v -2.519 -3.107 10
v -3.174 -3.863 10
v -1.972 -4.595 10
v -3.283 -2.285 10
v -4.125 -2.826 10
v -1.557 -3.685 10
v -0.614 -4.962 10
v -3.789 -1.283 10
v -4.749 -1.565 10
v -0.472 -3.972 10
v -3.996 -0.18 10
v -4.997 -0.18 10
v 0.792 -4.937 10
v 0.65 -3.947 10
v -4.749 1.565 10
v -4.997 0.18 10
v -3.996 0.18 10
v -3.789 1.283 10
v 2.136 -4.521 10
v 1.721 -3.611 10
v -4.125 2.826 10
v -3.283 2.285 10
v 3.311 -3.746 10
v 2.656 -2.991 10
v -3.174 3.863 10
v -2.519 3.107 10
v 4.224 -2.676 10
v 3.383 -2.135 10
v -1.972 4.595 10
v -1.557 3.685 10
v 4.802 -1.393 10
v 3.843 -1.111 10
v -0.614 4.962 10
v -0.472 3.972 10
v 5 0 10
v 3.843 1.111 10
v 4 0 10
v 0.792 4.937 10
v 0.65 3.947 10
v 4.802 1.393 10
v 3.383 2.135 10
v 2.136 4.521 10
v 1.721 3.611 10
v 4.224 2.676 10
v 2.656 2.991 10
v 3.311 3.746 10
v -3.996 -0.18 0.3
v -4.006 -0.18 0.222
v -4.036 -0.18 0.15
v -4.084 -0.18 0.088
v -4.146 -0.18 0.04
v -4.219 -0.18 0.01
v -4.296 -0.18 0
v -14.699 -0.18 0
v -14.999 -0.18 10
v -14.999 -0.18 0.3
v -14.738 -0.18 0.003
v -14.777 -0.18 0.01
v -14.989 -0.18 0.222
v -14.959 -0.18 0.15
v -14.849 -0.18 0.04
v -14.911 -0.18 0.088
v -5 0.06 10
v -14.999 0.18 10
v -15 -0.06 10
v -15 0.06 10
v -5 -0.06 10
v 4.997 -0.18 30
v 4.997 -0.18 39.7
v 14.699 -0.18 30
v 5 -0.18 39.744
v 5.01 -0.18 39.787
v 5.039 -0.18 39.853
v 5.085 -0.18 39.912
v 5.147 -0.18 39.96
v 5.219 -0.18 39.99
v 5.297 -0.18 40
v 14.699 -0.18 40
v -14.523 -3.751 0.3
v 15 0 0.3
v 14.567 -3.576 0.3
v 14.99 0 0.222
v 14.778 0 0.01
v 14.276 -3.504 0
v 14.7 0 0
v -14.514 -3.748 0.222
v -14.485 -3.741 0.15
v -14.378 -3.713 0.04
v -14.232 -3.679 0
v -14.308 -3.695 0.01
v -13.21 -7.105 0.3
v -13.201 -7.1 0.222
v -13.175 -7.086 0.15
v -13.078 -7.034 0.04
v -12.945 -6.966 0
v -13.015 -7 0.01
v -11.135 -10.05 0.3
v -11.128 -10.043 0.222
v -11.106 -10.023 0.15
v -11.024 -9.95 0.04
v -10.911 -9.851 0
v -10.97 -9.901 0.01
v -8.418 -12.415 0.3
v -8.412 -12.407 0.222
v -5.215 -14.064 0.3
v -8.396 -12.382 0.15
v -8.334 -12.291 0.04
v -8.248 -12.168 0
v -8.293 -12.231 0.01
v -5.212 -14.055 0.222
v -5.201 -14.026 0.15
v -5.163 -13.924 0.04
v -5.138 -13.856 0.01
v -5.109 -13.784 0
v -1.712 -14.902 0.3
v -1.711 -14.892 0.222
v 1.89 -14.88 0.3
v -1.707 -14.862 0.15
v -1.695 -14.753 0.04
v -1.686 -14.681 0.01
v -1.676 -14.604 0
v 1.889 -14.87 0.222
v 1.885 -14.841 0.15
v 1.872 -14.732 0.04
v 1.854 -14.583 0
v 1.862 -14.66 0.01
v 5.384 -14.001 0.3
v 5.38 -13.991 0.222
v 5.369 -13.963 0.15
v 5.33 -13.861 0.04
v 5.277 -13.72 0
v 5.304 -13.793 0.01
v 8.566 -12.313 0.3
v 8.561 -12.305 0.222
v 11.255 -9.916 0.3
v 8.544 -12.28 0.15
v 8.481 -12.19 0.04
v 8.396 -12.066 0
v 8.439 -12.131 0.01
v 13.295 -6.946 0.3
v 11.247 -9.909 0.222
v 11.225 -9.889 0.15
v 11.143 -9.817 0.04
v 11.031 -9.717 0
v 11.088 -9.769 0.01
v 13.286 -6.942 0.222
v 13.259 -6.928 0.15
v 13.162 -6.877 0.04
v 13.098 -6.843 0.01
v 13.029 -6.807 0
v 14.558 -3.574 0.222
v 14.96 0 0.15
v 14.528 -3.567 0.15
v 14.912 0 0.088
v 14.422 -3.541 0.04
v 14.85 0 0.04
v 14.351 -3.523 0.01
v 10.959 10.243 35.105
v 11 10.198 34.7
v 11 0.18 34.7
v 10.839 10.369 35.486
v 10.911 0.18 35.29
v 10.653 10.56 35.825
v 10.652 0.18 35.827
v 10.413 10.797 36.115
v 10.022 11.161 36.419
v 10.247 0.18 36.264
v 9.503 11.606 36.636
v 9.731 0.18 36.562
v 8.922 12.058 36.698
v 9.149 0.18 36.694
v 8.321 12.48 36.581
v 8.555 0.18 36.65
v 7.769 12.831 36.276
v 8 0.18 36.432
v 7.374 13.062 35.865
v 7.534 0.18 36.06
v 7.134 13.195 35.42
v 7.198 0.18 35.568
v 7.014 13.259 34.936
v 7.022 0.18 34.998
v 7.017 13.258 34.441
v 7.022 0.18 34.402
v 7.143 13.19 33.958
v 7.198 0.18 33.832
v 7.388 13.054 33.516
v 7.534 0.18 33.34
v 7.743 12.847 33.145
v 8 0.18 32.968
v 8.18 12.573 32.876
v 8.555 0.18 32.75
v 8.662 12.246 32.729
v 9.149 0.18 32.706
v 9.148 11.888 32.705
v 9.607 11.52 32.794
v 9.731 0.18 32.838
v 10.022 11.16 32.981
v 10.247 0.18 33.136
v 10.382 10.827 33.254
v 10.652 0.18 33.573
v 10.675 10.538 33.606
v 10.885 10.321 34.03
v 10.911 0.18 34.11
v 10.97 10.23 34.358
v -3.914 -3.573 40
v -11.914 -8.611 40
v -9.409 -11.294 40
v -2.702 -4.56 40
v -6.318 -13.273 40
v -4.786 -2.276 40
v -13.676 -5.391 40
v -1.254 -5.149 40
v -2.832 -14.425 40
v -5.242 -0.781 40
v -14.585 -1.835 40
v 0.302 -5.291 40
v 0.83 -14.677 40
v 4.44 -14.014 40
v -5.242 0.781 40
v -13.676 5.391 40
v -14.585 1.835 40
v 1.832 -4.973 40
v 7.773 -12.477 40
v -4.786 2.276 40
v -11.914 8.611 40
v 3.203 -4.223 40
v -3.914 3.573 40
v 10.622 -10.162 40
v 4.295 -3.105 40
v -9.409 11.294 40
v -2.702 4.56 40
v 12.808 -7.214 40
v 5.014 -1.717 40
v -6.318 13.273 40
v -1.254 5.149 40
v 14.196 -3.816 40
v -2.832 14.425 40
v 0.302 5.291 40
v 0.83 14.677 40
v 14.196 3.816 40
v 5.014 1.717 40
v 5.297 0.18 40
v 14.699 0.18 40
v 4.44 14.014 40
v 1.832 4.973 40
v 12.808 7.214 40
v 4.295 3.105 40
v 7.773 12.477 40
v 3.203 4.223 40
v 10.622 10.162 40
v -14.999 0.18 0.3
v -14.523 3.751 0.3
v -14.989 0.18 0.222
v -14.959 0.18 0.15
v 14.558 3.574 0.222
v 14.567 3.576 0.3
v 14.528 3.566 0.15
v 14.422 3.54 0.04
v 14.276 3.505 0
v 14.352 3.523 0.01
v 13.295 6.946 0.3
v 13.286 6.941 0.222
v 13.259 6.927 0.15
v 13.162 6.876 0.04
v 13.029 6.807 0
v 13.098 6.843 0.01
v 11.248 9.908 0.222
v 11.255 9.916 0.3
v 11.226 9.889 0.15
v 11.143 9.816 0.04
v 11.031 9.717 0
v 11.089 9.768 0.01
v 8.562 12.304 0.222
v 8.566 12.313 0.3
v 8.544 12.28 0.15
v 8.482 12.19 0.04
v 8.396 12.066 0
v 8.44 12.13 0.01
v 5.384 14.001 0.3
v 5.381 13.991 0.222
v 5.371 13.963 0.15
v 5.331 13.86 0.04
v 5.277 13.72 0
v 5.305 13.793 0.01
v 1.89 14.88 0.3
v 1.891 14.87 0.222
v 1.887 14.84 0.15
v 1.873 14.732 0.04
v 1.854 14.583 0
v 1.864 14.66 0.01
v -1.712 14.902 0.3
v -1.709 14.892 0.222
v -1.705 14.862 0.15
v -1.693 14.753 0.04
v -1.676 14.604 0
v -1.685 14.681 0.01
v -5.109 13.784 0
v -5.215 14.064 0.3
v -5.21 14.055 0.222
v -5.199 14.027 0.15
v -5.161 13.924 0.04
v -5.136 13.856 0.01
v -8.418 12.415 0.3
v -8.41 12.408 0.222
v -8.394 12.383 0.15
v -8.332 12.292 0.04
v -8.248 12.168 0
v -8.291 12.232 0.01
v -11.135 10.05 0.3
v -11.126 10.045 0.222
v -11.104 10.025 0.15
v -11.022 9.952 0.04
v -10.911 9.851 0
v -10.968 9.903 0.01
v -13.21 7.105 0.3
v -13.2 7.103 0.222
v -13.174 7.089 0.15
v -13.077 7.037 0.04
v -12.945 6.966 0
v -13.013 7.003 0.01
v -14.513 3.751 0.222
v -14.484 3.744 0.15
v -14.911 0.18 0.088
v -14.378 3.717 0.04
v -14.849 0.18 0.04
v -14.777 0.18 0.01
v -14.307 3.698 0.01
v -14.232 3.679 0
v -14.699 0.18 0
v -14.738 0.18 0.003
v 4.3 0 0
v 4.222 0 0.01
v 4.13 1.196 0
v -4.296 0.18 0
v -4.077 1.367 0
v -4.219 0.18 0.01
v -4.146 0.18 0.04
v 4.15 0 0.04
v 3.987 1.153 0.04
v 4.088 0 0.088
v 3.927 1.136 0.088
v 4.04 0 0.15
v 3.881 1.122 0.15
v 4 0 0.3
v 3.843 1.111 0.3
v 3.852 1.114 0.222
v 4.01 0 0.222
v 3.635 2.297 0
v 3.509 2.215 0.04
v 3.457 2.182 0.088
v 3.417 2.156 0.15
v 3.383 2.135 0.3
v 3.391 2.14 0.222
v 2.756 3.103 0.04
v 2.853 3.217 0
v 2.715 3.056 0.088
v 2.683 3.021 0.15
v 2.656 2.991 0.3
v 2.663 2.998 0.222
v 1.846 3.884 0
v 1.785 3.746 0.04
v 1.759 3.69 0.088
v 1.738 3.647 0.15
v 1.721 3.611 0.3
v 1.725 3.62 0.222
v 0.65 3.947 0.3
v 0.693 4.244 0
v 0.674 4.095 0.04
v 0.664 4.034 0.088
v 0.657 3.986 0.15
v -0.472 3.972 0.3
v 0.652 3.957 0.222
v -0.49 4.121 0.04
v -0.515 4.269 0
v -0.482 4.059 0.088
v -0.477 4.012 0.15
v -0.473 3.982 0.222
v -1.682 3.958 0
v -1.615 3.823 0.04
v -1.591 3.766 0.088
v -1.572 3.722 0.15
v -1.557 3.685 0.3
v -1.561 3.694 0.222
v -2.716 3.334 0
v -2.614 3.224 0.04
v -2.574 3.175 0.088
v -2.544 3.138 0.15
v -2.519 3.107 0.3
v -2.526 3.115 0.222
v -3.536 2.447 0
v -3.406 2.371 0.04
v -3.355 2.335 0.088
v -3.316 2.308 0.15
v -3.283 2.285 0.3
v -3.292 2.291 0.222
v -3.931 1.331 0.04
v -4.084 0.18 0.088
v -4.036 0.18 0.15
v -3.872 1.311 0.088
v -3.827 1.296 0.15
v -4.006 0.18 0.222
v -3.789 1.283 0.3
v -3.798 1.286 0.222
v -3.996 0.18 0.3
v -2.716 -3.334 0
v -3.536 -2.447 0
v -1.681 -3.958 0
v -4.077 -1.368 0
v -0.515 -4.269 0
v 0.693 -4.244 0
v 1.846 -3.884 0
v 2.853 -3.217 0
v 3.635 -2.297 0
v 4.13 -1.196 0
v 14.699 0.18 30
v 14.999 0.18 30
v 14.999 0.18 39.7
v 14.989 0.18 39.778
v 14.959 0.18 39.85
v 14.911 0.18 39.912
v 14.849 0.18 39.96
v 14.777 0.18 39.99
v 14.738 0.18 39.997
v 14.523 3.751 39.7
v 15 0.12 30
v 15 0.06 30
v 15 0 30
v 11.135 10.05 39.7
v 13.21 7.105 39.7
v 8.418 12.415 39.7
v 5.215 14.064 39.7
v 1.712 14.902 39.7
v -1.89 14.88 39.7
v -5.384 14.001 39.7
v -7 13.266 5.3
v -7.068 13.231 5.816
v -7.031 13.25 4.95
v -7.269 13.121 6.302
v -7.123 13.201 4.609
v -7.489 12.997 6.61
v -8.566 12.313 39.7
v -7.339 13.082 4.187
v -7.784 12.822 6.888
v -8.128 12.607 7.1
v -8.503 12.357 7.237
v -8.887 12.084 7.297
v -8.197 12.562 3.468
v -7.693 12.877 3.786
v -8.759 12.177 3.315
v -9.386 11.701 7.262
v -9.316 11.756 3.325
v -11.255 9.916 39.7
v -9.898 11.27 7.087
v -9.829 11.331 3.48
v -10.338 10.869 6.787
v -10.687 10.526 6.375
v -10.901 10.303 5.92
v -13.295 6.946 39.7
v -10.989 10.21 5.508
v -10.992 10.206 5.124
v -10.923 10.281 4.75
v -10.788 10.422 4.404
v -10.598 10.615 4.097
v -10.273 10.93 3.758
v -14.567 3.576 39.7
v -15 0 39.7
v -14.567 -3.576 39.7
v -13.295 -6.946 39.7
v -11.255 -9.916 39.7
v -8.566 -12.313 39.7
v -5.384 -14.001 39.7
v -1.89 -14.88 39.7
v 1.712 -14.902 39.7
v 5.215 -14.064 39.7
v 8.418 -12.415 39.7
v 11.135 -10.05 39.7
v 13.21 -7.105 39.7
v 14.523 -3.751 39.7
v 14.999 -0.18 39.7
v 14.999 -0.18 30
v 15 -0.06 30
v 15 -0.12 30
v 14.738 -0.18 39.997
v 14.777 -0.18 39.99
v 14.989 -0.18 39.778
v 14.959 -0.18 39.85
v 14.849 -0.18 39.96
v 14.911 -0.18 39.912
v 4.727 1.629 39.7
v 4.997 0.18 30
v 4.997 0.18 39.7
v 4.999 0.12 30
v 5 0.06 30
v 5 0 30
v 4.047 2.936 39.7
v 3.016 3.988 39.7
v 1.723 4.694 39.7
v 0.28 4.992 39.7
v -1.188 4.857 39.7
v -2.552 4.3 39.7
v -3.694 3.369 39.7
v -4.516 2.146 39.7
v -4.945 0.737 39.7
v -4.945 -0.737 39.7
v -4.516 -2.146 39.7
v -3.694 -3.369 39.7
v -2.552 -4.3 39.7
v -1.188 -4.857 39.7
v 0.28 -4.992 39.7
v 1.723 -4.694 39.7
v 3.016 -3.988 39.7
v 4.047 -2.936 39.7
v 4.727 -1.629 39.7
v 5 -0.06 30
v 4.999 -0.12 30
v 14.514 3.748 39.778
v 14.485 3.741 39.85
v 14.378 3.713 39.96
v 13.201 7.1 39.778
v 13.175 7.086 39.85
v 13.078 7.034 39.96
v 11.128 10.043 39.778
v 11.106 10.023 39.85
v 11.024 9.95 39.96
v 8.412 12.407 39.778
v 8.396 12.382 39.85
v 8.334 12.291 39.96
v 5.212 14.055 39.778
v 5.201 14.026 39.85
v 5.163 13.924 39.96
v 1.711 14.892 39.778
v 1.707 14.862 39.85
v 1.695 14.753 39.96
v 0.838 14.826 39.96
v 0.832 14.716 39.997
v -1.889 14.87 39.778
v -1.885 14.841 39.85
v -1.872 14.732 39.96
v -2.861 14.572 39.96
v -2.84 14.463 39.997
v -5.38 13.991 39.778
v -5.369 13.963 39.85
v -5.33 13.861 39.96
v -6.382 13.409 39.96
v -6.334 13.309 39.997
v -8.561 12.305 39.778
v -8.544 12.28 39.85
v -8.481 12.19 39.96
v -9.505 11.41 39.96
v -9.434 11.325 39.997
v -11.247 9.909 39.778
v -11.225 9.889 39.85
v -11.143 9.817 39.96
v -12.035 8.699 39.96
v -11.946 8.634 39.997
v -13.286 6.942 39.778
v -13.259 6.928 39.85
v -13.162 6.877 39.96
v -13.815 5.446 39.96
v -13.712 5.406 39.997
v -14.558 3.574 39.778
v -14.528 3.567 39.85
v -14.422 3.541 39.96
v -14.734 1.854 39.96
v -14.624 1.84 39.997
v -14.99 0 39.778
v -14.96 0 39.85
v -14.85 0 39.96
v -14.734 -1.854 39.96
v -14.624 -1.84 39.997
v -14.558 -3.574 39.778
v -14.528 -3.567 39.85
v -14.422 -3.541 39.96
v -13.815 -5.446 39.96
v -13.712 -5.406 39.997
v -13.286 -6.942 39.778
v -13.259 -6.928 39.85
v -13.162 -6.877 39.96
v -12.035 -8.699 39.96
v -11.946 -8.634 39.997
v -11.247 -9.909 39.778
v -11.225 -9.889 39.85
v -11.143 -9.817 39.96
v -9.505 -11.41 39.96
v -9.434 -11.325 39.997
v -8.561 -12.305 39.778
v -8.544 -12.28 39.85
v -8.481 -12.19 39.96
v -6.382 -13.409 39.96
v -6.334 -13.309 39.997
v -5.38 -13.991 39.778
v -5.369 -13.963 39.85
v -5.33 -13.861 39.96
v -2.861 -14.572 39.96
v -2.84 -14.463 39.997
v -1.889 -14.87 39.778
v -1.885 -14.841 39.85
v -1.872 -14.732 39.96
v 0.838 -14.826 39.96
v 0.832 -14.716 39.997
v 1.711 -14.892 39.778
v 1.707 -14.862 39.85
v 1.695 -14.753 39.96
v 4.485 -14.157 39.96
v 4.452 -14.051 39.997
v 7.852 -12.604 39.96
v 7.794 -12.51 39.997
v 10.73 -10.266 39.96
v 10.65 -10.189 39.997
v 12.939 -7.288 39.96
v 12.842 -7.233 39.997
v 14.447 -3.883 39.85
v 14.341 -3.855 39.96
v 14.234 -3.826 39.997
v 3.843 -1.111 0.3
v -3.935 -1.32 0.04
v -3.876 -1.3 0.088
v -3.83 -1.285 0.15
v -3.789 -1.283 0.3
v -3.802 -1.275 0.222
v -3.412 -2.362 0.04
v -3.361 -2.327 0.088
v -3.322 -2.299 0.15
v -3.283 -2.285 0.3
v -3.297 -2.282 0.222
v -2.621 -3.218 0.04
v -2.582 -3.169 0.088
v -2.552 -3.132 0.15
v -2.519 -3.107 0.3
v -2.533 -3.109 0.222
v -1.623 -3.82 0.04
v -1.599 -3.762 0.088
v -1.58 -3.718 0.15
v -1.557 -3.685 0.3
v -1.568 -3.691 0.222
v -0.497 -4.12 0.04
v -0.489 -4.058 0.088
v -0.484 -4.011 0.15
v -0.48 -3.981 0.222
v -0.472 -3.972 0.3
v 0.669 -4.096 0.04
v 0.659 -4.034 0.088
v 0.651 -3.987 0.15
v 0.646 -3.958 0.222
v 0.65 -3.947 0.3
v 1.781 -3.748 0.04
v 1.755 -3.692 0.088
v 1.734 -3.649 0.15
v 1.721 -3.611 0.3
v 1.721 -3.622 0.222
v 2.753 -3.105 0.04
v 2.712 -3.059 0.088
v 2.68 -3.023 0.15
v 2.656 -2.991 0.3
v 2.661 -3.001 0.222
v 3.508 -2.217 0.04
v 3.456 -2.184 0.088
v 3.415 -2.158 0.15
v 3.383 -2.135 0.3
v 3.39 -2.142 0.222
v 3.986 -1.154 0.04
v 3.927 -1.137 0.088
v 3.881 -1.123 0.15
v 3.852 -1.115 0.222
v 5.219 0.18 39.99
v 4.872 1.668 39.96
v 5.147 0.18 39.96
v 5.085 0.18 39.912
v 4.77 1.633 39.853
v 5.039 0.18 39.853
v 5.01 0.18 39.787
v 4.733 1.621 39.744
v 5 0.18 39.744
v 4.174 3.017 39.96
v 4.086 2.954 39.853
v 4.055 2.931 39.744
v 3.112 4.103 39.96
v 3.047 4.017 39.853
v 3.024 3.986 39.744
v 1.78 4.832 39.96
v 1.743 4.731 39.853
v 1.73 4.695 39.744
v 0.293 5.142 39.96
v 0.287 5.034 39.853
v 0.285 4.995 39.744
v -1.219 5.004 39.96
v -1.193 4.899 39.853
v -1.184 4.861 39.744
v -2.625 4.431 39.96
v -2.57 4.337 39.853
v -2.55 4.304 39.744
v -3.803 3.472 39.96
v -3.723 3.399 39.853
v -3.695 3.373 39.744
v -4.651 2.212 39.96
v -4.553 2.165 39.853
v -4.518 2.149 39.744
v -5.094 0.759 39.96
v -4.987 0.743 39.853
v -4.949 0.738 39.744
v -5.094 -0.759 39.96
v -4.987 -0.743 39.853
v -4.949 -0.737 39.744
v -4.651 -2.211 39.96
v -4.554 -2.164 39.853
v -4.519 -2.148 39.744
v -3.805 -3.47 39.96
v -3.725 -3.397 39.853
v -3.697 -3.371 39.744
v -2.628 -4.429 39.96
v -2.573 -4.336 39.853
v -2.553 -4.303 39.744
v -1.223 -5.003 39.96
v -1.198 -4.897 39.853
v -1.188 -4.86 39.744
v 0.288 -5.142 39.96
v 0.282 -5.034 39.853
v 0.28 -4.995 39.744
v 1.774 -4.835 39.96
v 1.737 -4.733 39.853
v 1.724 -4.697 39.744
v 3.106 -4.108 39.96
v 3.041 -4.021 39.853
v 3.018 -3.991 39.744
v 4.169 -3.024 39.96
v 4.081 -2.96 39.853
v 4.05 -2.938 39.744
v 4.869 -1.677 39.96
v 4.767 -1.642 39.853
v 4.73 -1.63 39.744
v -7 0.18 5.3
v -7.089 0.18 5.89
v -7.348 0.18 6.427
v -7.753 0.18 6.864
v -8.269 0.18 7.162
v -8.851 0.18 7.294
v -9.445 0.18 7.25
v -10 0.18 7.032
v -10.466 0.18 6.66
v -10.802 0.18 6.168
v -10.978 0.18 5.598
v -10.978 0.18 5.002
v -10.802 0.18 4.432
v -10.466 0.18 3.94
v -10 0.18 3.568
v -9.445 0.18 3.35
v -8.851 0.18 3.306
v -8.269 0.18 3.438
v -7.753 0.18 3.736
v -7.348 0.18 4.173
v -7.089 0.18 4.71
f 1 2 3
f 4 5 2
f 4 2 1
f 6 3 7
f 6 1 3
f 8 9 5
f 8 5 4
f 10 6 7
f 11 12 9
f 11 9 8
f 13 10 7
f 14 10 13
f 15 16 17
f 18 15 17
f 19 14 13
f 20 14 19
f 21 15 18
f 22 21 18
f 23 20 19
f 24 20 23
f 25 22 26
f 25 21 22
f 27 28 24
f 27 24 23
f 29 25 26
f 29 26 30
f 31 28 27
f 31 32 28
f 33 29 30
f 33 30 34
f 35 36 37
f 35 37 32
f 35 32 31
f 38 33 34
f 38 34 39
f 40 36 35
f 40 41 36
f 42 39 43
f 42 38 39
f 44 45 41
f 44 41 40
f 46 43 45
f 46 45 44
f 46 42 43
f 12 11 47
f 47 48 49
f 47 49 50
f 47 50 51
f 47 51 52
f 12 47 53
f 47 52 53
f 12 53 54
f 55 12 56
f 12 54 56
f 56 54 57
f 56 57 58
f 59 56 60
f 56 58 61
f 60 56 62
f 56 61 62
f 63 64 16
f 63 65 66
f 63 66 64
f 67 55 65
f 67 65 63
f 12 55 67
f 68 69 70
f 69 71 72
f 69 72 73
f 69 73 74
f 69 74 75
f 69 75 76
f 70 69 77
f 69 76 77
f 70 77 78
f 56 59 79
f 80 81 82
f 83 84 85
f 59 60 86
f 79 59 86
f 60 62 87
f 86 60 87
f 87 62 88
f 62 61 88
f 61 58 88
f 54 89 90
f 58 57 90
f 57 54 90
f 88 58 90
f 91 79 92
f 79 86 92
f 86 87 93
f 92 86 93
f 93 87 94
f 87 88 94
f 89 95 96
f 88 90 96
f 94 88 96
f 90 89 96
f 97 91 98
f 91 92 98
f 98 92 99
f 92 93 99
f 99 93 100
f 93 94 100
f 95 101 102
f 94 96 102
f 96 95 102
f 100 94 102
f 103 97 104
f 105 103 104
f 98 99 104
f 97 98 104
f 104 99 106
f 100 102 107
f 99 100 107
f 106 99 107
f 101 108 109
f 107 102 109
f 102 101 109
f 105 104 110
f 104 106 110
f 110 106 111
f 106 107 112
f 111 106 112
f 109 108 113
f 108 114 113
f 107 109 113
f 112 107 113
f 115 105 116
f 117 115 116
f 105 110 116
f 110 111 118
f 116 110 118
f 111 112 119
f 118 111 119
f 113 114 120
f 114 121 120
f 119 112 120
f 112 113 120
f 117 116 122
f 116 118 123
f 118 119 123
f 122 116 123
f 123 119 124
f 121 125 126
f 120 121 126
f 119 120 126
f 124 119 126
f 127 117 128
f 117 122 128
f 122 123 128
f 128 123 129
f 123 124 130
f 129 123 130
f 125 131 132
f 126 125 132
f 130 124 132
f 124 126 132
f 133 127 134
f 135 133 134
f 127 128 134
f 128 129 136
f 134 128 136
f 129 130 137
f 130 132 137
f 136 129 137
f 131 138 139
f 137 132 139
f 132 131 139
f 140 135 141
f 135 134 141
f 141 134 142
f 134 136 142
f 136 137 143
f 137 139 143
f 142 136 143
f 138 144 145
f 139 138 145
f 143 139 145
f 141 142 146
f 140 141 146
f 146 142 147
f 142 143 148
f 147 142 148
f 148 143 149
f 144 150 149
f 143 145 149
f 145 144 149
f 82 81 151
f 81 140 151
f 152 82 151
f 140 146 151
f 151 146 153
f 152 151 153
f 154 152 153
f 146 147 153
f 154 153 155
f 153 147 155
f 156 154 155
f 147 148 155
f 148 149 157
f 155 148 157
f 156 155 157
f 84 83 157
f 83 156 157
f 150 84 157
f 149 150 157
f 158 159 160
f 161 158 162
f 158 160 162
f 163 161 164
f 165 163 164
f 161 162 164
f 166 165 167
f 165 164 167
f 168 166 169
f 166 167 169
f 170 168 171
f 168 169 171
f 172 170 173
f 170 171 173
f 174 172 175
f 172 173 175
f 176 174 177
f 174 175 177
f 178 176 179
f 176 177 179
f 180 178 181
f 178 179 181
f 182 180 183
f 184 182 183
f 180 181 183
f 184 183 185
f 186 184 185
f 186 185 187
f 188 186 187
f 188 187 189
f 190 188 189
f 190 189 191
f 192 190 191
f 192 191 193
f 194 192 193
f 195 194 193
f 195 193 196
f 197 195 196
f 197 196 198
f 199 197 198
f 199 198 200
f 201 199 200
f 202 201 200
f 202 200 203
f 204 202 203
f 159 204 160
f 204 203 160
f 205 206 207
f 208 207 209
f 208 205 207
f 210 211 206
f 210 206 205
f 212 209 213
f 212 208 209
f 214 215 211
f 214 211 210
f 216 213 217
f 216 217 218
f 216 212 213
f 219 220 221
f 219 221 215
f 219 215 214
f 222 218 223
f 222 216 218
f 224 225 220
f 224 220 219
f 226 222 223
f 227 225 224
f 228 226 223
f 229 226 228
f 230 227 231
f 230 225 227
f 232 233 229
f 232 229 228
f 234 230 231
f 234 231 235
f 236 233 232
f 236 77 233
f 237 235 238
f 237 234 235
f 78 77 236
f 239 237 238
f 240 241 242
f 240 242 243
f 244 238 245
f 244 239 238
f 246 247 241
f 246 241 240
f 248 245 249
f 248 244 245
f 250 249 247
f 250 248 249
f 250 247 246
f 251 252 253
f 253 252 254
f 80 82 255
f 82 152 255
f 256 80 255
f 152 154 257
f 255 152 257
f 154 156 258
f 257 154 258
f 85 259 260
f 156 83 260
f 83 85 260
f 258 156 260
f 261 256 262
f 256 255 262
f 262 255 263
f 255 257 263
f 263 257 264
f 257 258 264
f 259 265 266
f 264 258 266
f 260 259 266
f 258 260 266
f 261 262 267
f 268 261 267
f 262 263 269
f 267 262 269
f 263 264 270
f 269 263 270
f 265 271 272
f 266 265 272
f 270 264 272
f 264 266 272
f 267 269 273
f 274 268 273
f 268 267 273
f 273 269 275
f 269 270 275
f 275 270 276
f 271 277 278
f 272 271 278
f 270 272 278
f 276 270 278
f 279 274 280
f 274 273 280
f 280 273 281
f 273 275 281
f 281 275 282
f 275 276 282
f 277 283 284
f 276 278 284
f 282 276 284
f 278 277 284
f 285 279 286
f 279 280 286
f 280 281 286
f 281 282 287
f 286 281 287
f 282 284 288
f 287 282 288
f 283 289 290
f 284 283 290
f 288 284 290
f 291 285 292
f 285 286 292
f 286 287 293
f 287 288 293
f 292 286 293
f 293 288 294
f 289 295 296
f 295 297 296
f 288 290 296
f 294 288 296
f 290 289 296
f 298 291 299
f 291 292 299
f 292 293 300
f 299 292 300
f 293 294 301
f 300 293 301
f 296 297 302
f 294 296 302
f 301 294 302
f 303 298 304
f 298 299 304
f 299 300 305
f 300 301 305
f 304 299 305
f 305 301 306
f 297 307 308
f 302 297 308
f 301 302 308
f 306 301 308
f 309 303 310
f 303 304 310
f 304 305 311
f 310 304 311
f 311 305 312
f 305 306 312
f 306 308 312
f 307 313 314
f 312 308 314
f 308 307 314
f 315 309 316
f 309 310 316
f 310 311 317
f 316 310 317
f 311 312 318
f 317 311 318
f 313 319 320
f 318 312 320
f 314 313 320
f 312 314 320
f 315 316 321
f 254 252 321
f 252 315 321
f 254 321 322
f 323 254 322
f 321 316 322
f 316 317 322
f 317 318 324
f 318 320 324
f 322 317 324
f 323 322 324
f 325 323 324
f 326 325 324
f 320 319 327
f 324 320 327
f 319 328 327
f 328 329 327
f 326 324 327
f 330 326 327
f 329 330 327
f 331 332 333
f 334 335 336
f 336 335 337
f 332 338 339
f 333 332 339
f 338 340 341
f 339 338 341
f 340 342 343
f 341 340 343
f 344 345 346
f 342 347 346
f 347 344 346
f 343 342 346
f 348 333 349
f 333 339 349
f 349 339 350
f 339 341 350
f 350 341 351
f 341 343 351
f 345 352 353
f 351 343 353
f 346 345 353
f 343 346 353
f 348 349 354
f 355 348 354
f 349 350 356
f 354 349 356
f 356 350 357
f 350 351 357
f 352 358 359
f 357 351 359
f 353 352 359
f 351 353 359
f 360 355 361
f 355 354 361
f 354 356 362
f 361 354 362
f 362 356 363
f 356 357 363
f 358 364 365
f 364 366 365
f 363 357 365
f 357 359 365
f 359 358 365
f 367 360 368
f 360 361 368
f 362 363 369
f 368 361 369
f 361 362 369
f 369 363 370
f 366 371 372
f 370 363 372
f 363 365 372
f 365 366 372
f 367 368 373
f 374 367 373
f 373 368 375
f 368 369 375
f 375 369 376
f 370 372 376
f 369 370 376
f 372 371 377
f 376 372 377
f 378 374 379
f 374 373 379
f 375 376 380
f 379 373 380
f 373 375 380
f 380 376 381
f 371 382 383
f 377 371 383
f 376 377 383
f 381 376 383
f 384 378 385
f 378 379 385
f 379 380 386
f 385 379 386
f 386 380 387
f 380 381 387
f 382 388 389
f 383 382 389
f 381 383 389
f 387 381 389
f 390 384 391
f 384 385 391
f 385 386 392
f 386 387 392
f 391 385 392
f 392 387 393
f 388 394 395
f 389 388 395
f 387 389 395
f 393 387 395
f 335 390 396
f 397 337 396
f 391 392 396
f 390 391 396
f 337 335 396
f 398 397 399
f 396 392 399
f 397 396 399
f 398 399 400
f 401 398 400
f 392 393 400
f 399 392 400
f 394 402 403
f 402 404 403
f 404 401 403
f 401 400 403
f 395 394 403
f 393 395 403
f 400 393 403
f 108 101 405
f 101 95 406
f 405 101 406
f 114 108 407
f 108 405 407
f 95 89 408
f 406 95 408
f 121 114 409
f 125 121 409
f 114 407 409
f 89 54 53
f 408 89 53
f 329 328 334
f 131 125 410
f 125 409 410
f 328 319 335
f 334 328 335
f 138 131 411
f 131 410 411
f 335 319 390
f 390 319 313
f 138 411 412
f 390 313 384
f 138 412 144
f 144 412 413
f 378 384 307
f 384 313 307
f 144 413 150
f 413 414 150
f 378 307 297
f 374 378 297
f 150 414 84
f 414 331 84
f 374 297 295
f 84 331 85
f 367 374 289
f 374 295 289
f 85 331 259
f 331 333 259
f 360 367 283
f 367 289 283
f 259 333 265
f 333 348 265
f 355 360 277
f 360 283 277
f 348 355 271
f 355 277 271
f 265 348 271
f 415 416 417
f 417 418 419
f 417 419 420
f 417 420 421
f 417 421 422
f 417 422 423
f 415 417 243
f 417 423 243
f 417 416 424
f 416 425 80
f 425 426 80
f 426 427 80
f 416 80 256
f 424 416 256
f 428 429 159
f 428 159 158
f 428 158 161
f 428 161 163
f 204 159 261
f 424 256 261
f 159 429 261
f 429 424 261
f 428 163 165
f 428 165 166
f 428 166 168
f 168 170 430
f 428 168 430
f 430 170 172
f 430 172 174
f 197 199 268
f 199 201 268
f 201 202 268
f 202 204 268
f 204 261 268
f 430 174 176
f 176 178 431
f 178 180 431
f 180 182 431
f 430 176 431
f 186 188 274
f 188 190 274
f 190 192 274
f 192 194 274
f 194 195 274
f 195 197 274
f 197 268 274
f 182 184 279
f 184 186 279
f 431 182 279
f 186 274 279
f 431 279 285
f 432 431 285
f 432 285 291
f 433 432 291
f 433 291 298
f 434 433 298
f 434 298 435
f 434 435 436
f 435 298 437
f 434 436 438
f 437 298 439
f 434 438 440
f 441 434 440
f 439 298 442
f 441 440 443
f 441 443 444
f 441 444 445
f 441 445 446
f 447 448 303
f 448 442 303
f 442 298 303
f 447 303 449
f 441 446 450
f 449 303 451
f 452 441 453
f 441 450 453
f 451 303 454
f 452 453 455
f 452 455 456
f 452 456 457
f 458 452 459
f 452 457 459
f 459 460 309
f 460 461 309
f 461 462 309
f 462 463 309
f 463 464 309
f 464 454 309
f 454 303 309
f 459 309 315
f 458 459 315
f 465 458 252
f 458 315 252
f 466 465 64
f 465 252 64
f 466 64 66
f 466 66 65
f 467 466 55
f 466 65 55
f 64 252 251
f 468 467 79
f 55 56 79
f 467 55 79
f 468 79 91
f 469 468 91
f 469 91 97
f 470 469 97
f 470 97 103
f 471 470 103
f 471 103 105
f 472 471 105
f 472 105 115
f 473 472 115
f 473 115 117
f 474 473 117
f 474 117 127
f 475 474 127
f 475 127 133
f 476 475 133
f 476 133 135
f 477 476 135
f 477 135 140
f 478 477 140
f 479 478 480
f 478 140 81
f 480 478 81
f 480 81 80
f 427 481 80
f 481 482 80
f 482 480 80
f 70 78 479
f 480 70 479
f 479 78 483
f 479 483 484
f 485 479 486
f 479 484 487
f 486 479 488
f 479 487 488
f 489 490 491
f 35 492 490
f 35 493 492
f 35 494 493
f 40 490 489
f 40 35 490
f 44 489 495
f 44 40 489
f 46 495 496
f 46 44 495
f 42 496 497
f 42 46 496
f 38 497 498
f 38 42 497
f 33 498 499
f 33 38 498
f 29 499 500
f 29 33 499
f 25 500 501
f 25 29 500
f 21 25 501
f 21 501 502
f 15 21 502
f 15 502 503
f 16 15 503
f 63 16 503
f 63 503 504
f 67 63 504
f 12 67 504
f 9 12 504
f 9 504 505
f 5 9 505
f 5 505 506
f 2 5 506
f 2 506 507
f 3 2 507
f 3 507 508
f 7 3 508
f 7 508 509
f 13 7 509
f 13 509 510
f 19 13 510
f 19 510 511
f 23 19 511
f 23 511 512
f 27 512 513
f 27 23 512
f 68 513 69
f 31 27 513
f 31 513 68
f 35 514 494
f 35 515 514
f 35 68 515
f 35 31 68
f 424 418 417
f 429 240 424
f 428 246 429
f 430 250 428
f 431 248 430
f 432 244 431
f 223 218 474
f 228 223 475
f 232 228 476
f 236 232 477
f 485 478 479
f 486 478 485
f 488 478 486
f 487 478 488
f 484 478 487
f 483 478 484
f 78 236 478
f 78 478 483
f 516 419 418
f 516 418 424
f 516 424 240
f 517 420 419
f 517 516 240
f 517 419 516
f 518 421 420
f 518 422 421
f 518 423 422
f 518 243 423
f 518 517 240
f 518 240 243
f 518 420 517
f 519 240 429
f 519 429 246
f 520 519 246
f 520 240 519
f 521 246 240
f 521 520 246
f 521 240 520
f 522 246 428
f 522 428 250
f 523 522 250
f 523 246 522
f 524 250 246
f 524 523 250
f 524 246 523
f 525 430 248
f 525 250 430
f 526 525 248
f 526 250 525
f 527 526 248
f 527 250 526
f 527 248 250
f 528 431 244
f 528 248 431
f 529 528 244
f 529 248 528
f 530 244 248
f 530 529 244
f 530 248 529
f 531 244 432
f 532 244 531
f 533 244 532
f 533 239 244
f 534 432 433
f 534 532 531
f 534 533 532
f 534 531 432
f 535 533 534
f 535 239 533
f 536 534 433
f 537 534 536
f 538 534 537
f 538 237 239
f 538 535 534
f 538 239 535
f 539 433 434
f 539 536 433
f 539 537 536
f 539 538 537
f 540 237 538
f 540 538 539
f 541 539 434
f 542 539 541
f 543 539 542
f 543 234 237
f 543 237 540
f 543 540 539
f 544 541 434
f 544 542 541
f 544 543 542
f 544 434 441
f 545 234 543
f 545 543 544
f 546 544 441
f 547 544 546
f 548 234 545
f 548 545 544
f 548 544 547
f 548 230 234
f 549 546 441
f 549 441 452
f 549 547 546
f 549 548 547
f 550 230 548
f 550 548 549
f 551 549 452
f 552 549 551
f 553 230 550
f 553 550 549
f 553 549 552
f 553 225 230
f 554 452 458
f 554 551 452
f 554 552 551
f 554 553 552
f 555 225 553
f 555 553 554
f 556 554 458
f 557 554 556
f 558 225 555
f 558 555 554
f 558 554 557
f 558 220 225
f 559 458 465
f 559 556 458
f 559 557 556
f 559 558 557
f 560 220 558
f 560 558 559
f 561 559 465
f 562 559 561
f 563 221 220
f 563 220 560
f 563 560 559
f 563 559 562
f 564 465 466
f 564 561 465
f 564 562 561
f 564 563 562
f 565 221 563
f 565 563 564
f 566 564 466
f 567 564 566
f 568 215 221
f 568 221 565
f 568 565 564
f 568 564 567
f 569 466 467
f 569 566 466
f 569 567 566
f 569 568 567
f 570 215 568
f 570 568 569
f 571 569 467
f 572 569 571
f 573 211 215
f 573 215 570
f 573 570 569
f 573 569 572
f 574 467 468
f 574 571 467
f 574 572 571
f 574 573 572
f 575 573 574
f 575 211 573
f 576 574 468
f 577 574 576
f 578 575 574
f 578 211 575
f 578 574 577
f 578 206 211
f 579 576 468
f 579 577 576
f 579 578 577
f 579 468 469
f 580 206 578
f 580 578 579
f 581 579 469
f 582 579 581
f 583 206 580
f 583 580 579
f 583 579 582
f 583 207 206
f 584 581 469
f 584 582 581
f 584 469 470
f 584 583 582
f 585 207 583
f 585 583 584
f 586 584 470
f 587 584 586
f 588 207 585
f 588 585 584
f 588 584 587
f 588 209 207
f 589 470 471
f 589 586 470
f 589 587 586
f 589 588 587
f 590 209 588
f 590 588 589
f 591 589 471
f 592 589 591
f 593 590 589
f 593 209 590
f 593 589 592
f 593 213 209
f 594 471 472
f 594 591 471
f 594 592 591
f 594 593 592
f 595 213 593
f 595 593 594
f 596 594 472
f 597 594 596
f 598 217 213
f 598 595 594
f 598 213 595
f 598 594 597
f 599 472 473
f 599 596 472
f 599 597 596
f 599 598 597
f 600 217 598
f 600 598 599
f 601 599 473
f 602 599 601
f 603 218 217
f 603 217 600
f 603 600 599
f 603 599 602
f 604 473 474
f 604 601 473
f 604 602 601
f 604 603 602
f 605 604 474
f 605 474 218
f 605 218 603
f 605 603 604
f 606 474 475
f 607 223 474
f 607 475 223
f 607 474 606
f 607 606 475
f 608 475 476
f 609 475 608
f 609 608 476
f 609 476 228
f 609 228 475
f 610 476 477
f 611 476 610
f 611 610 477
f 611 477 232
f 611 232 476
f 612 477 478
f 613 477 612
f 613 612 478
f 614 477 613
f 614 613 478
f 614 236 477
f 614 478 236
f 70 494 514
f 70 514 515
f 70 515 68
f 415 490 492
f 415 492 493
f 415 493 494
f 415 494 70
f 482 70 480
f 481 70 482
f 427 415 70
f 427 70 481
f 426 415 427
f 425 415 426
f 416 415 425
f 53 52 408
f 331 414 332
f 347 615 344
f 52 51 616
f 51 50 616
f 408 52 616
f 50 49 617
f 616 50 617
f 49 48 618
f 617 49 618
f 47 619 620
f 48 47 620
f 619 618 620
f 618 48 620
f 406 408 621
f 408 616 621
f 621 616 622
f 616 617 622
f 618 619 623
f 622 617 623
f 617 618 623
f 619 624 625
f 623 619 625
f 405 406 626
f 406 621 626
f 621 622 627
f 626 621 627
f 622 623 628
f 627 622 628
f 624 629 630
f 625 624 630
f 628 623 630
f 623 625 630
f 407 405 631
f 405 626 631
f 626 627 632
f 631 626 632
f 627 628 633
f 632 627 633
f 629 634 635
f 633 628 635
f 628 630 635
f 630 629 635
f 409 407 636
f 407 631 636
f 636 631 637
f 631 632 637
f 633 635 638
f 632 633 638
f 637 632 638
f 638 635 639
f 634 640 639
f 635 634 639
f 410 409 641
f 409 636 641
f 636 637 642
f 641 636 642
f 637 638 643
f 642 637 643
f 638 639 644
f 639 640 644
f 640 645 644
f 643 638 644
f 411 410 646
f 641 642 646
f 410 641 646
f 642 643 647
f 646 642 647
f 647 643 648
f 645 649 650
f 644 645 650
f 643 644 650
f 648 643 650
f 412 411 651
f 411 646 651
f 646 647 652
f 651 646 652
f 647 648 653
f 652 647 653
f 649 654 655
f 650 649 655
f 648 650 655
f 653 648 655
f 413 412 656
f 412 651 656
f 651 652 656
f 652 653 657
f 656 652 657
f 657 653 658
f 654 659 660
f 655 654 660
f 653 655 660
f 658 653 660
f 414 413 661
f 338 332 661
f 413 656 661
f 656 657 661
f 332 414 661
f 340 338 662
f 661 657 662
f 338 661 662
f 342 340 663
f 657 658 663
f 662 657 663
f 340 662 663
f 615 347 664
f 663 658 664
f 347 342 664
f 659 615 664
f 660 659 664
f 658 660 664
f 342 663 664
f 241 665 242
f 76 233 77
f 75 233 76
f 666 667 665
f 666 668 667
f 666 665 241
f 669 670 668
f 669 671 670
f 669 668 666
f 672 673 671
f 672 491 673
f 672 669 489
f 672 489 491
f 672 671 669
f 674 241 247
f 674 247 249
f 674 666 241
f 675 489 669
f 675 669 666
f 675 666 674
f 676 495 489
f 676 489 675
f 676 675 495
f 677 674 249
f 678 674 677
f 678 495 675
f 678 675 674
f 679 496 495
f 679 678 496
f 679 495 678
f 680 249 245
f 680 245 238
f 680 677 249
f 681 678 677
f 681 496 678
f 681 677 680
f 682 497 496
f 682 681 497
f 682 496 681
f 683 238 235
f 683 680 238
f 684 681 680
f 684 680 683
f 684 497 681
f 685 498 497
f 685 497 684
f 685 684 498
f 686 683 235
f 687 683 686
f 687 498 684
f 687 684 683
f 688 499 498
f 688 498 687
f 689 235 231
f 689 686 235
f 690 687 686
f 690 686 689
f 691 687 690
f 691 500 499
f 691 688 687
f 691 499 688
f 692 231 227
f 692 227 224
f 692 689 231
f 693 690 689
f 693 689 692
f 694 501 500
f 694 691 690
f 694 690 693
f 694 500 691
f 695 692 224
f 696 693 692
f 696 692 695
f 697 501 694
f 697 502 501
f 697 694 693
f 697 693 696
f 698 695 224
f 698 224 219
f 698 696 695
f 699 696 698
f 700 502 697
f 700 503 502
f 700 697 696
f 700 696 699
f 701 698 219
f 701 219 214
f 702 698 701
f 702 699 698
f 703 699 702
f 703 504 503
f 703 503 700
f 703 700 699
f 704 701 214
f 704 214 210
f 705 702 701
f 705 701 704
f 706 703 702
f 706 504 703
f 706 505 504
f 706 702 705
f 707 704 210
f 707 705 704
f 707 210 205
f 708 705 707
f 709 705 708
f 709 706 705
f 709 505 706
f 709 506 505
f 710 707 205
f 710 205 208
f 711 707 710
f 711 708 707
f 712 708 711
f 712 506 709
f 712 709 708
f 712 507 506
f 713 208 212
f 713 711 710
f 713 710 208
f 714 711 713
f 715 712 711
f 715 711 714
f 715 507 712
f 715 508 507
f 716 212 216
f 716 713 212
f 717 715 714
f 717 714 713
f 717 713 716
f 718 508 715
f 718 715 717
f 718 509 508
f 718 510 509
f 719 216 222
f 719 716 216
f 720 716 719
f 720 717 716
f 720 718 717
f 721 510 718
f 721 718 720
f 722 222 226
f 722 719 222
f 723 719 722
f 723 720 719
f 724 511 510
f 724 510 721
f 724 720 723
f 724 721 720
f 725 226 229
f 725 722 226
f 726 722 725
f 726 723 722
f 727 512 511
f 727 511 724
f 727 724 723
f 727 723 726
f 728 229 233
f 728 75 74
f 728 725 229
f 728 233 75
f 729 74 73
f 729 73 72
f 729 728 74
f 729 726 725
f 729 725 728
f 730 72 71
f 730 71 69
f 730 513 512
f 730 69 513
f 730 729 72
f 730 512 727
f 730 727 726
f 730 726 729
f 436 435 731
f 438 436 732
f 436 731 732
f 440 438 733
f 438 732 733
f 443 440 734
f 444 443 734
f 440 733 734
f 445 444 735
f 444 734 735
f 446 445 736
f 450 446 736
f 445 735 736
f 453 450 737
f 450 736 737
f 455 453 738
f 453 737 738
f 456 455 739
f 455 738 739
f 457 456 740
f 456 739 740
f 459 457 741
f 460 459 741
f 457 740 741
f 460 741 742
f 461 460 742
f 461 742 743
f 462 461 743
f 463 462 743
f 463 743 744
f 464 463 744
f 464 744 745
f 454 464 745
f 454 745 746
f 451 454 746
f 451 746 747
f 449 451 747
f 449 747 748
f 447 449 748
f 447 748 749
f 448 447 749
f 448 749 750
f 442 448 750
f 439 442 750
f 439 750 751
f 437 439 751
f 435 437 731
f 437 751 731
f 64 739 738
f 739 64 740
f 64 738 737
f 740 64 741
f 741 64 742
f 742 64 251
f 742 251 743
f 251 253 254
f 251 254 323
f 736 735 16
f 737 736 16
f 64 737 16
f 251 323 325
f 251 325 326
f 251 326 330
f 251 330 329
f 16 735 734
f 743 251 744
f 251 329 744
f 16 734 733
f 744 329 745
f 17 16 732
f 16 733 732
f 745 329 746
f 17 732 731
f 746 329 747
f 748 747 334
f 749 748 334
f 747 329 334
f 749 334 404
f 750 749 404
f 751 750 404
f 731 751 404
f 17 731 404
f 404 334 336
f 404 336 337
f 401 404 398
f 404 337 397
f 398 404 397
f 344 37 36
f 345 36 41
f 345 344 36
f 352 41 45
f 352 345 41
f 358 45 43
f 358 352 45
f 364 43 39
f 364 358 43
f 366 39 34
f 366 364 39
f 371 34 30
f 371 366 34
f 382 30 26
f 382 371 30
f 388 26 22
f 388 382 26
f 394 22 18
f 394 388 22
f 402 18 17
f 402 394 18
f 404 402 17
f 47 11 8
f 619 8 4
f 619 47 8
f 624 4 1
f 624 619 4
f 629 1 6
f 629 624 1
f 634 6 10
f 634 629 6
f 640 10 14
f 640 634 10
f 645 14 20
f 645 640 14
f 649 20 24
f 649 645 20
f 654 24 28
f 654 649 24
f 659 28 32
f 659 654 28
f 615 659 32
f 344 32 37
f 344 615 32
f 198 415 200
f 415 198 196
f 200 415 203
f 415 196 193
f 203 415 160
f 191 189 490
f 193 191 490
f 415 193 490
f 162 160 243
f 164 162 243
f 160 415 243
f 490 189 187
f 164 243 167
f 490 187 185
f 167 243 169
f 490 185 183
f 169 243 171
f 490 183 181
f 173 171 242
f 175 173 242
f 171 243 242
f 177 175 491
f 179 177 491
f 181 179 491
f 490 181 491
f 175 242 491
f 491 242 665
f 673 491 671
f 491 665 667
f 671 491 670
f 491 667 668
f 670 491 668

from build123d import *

# Parameters (mm, degrees)
F0_R      = 15
F0_R_2    = 4
F1_DEPTH  = 10
F2_R      = 15
F2_R_2    = 5
F3_DEPTH  = 30
F4_R      = 0.3
F5_R      = 0.3
F6_R      = 2
F7_DEPTH  = 20.34312
F9_DEPTH  = 10
F11_DEPTH = 10


with BuildPart() as f1:
    # F0 (on Top) → F1 (new body)
    with BuildSketch(Plane.XY):
        Circle(F0_R)
        Circle(F0_R_2, mode=Mode.SUBTRACT)
    extrude(amount=F1_DEPTH)

    # F2 (on face) → F3 (join)
    with BuildSketch(Plane.XY.offset(10)):
        Circle(F2_R)
        Circle(F2_R_2, mode=Mode.SUBTRACT)
    extrude(amount=F3_DEPTH)

    # F4
    f4_edges = [f1.edges().sort_by_distance(p)[0] for p in [
        (-15, 0, 40),
    ]]
    fillet(f4_edges, radius=F4_R)

    # F5
    f5_edges = [f1.edges().sort_by_distance(p)[0] for p in [
        (-15, 0, 0),
        (-5, 0, 40),
        (-4, 0, 0),
    ]]
    fillet(f5_edges, radius=F5_R)

    # F6 (on Front) → F7 (cut)
    with BuildSketch(Plane.XZ):
        with Locations((9, 34.7)):
            Circle(F6_R)
        with Locations((-9, 5.3)):
            Circle(F6_R)
    extrude(amount=-F7_DEPTH, mode=Mode.SUBTRACT)

    # F8 (on face) → F9 (cut)
    with BuildSketch(Plane.XY.offset(40)):
        with BuildLine():
            Line((2.5762253208, -0.1799123052), (5.2969454936, -0.1799123052))
            ThreePointArc((5.2969454936, -0.1799123052), (5.2992363184, -0.0899691164), (5.3, 0))
            ThreePointArc((5.3, 0), (5.2992363184, 0.0899691164), (5.2969454936, 0.1799123052))
            Line((5.2969454936, 0.1799123052), (2.5762253208, 0.1799123052))
            Line((2.5762253208, 0.1799123052), (2.5762253208, -0.1799123052))
        make_face()
        with BuildLine():
            Line((5.2969454936, -0.1799123052), (14.6988989915, -0.1799123052))
            ThreePointArc((14.6988989915, -0.1799123053), (14.6997247453, -0.0899578371), (14.7, 0))
            ThreePointArc((14.7, 0), (14.6997247453, 0.0899578371), (14.6988989915, 0.1799123053))
            Line((14.6988989915, 0.1799123052), (5.2969454936, 0.1799123052))
            ThreePointArc((5.2969454936, 0.1799123052), (5.2992363184, 0.0899691164), (5.3, 0))
            ThreePointArc((5.3, 0), (5.2992363184, -0.0899691164), (5.2969454936, -0.1799123052))
        make_face()
        with BuildLine():
            Line((14.6988989915, -0.1799123052), (17.0045065461, -0.1799123052))
            Line((17.0045065461, -0.1799123052), (17.0045065461, 0.1799123052))
            Line((17.0045065461, 0.1799123052), (14.6988989915, 0.1799123052))
            ThreePointArc((14.6988989915, 0.1799123053), (14.6997247453, 0.0899578371), (14.7, 0))
            ThreePointArc((14.7, 0), (14.6997247453, -0.0899578371), (14.6988989915, -0.1799123053))
        make_face()
    extrude(amount=-F9_DEPTH, mode=Mode.SUBTRACT)

    # F10 (on face) → F11 (cut)
    with BuildSketch(Plane(origin=(0, 0, 0), x_dir=(1, 0, 0), z_dir=(0, 0, -1))):
        with BuildLine():
            Line((-4.2962360163, -0.1798779937), (-1.9751195796, -0.1798779937))
            Line((-1.9751195796, -0.1798779937), (-1.9751195796, 0.1799466168))
            Line((-1.9751195796, 0.1799466168), (-4.2962331425, 0.1799466168))
            ThreePointArc((-4.2962331425, 0.1799466168), (-4.2999999999, 3.43417e-05), (-4.2962360163, -0.1798779937))
        make_face()
        with BuildLine():
            Line((-14.6988994114, -0.1798779937), (-4.2962360163, -0.1798779937))
            ThreePointArc((-4.2962360163, -0.1798779937), (-4.2999999999, 3.43417e-05), (-4.2962331425, 0.1799466168))
            Line((-4.2962331425, 0.1799466168), (-14.6988985715, 0.1799466168))
            ThreePointArc((-14.6988985715, 0.1799466168), (-14.7, 3.43142e-05), (-14.6988994114, -0.1798779937))
        make_face()
        with BuildLine():
            Line((-16.4034008048, -0.1798779937), (-14.6988994114, -0.1798779937))
            ThreePointArc((-14.6988994114, -0.1798779937), (-14.7, 3.43142e-05), (-14.6988985715, 0.1799466168))
            Line((-14.6988985715, 0.1799466168), (-16.4034008048, 0.1799466168))
            Line((-16.4034008048, 0.1799466168), (-16.4034008048, -0.1798779937))
        make_face()
    extrude(amount=-F11_DEPTH, mode=Mode.SUBTRACT)


solid = f1.part
